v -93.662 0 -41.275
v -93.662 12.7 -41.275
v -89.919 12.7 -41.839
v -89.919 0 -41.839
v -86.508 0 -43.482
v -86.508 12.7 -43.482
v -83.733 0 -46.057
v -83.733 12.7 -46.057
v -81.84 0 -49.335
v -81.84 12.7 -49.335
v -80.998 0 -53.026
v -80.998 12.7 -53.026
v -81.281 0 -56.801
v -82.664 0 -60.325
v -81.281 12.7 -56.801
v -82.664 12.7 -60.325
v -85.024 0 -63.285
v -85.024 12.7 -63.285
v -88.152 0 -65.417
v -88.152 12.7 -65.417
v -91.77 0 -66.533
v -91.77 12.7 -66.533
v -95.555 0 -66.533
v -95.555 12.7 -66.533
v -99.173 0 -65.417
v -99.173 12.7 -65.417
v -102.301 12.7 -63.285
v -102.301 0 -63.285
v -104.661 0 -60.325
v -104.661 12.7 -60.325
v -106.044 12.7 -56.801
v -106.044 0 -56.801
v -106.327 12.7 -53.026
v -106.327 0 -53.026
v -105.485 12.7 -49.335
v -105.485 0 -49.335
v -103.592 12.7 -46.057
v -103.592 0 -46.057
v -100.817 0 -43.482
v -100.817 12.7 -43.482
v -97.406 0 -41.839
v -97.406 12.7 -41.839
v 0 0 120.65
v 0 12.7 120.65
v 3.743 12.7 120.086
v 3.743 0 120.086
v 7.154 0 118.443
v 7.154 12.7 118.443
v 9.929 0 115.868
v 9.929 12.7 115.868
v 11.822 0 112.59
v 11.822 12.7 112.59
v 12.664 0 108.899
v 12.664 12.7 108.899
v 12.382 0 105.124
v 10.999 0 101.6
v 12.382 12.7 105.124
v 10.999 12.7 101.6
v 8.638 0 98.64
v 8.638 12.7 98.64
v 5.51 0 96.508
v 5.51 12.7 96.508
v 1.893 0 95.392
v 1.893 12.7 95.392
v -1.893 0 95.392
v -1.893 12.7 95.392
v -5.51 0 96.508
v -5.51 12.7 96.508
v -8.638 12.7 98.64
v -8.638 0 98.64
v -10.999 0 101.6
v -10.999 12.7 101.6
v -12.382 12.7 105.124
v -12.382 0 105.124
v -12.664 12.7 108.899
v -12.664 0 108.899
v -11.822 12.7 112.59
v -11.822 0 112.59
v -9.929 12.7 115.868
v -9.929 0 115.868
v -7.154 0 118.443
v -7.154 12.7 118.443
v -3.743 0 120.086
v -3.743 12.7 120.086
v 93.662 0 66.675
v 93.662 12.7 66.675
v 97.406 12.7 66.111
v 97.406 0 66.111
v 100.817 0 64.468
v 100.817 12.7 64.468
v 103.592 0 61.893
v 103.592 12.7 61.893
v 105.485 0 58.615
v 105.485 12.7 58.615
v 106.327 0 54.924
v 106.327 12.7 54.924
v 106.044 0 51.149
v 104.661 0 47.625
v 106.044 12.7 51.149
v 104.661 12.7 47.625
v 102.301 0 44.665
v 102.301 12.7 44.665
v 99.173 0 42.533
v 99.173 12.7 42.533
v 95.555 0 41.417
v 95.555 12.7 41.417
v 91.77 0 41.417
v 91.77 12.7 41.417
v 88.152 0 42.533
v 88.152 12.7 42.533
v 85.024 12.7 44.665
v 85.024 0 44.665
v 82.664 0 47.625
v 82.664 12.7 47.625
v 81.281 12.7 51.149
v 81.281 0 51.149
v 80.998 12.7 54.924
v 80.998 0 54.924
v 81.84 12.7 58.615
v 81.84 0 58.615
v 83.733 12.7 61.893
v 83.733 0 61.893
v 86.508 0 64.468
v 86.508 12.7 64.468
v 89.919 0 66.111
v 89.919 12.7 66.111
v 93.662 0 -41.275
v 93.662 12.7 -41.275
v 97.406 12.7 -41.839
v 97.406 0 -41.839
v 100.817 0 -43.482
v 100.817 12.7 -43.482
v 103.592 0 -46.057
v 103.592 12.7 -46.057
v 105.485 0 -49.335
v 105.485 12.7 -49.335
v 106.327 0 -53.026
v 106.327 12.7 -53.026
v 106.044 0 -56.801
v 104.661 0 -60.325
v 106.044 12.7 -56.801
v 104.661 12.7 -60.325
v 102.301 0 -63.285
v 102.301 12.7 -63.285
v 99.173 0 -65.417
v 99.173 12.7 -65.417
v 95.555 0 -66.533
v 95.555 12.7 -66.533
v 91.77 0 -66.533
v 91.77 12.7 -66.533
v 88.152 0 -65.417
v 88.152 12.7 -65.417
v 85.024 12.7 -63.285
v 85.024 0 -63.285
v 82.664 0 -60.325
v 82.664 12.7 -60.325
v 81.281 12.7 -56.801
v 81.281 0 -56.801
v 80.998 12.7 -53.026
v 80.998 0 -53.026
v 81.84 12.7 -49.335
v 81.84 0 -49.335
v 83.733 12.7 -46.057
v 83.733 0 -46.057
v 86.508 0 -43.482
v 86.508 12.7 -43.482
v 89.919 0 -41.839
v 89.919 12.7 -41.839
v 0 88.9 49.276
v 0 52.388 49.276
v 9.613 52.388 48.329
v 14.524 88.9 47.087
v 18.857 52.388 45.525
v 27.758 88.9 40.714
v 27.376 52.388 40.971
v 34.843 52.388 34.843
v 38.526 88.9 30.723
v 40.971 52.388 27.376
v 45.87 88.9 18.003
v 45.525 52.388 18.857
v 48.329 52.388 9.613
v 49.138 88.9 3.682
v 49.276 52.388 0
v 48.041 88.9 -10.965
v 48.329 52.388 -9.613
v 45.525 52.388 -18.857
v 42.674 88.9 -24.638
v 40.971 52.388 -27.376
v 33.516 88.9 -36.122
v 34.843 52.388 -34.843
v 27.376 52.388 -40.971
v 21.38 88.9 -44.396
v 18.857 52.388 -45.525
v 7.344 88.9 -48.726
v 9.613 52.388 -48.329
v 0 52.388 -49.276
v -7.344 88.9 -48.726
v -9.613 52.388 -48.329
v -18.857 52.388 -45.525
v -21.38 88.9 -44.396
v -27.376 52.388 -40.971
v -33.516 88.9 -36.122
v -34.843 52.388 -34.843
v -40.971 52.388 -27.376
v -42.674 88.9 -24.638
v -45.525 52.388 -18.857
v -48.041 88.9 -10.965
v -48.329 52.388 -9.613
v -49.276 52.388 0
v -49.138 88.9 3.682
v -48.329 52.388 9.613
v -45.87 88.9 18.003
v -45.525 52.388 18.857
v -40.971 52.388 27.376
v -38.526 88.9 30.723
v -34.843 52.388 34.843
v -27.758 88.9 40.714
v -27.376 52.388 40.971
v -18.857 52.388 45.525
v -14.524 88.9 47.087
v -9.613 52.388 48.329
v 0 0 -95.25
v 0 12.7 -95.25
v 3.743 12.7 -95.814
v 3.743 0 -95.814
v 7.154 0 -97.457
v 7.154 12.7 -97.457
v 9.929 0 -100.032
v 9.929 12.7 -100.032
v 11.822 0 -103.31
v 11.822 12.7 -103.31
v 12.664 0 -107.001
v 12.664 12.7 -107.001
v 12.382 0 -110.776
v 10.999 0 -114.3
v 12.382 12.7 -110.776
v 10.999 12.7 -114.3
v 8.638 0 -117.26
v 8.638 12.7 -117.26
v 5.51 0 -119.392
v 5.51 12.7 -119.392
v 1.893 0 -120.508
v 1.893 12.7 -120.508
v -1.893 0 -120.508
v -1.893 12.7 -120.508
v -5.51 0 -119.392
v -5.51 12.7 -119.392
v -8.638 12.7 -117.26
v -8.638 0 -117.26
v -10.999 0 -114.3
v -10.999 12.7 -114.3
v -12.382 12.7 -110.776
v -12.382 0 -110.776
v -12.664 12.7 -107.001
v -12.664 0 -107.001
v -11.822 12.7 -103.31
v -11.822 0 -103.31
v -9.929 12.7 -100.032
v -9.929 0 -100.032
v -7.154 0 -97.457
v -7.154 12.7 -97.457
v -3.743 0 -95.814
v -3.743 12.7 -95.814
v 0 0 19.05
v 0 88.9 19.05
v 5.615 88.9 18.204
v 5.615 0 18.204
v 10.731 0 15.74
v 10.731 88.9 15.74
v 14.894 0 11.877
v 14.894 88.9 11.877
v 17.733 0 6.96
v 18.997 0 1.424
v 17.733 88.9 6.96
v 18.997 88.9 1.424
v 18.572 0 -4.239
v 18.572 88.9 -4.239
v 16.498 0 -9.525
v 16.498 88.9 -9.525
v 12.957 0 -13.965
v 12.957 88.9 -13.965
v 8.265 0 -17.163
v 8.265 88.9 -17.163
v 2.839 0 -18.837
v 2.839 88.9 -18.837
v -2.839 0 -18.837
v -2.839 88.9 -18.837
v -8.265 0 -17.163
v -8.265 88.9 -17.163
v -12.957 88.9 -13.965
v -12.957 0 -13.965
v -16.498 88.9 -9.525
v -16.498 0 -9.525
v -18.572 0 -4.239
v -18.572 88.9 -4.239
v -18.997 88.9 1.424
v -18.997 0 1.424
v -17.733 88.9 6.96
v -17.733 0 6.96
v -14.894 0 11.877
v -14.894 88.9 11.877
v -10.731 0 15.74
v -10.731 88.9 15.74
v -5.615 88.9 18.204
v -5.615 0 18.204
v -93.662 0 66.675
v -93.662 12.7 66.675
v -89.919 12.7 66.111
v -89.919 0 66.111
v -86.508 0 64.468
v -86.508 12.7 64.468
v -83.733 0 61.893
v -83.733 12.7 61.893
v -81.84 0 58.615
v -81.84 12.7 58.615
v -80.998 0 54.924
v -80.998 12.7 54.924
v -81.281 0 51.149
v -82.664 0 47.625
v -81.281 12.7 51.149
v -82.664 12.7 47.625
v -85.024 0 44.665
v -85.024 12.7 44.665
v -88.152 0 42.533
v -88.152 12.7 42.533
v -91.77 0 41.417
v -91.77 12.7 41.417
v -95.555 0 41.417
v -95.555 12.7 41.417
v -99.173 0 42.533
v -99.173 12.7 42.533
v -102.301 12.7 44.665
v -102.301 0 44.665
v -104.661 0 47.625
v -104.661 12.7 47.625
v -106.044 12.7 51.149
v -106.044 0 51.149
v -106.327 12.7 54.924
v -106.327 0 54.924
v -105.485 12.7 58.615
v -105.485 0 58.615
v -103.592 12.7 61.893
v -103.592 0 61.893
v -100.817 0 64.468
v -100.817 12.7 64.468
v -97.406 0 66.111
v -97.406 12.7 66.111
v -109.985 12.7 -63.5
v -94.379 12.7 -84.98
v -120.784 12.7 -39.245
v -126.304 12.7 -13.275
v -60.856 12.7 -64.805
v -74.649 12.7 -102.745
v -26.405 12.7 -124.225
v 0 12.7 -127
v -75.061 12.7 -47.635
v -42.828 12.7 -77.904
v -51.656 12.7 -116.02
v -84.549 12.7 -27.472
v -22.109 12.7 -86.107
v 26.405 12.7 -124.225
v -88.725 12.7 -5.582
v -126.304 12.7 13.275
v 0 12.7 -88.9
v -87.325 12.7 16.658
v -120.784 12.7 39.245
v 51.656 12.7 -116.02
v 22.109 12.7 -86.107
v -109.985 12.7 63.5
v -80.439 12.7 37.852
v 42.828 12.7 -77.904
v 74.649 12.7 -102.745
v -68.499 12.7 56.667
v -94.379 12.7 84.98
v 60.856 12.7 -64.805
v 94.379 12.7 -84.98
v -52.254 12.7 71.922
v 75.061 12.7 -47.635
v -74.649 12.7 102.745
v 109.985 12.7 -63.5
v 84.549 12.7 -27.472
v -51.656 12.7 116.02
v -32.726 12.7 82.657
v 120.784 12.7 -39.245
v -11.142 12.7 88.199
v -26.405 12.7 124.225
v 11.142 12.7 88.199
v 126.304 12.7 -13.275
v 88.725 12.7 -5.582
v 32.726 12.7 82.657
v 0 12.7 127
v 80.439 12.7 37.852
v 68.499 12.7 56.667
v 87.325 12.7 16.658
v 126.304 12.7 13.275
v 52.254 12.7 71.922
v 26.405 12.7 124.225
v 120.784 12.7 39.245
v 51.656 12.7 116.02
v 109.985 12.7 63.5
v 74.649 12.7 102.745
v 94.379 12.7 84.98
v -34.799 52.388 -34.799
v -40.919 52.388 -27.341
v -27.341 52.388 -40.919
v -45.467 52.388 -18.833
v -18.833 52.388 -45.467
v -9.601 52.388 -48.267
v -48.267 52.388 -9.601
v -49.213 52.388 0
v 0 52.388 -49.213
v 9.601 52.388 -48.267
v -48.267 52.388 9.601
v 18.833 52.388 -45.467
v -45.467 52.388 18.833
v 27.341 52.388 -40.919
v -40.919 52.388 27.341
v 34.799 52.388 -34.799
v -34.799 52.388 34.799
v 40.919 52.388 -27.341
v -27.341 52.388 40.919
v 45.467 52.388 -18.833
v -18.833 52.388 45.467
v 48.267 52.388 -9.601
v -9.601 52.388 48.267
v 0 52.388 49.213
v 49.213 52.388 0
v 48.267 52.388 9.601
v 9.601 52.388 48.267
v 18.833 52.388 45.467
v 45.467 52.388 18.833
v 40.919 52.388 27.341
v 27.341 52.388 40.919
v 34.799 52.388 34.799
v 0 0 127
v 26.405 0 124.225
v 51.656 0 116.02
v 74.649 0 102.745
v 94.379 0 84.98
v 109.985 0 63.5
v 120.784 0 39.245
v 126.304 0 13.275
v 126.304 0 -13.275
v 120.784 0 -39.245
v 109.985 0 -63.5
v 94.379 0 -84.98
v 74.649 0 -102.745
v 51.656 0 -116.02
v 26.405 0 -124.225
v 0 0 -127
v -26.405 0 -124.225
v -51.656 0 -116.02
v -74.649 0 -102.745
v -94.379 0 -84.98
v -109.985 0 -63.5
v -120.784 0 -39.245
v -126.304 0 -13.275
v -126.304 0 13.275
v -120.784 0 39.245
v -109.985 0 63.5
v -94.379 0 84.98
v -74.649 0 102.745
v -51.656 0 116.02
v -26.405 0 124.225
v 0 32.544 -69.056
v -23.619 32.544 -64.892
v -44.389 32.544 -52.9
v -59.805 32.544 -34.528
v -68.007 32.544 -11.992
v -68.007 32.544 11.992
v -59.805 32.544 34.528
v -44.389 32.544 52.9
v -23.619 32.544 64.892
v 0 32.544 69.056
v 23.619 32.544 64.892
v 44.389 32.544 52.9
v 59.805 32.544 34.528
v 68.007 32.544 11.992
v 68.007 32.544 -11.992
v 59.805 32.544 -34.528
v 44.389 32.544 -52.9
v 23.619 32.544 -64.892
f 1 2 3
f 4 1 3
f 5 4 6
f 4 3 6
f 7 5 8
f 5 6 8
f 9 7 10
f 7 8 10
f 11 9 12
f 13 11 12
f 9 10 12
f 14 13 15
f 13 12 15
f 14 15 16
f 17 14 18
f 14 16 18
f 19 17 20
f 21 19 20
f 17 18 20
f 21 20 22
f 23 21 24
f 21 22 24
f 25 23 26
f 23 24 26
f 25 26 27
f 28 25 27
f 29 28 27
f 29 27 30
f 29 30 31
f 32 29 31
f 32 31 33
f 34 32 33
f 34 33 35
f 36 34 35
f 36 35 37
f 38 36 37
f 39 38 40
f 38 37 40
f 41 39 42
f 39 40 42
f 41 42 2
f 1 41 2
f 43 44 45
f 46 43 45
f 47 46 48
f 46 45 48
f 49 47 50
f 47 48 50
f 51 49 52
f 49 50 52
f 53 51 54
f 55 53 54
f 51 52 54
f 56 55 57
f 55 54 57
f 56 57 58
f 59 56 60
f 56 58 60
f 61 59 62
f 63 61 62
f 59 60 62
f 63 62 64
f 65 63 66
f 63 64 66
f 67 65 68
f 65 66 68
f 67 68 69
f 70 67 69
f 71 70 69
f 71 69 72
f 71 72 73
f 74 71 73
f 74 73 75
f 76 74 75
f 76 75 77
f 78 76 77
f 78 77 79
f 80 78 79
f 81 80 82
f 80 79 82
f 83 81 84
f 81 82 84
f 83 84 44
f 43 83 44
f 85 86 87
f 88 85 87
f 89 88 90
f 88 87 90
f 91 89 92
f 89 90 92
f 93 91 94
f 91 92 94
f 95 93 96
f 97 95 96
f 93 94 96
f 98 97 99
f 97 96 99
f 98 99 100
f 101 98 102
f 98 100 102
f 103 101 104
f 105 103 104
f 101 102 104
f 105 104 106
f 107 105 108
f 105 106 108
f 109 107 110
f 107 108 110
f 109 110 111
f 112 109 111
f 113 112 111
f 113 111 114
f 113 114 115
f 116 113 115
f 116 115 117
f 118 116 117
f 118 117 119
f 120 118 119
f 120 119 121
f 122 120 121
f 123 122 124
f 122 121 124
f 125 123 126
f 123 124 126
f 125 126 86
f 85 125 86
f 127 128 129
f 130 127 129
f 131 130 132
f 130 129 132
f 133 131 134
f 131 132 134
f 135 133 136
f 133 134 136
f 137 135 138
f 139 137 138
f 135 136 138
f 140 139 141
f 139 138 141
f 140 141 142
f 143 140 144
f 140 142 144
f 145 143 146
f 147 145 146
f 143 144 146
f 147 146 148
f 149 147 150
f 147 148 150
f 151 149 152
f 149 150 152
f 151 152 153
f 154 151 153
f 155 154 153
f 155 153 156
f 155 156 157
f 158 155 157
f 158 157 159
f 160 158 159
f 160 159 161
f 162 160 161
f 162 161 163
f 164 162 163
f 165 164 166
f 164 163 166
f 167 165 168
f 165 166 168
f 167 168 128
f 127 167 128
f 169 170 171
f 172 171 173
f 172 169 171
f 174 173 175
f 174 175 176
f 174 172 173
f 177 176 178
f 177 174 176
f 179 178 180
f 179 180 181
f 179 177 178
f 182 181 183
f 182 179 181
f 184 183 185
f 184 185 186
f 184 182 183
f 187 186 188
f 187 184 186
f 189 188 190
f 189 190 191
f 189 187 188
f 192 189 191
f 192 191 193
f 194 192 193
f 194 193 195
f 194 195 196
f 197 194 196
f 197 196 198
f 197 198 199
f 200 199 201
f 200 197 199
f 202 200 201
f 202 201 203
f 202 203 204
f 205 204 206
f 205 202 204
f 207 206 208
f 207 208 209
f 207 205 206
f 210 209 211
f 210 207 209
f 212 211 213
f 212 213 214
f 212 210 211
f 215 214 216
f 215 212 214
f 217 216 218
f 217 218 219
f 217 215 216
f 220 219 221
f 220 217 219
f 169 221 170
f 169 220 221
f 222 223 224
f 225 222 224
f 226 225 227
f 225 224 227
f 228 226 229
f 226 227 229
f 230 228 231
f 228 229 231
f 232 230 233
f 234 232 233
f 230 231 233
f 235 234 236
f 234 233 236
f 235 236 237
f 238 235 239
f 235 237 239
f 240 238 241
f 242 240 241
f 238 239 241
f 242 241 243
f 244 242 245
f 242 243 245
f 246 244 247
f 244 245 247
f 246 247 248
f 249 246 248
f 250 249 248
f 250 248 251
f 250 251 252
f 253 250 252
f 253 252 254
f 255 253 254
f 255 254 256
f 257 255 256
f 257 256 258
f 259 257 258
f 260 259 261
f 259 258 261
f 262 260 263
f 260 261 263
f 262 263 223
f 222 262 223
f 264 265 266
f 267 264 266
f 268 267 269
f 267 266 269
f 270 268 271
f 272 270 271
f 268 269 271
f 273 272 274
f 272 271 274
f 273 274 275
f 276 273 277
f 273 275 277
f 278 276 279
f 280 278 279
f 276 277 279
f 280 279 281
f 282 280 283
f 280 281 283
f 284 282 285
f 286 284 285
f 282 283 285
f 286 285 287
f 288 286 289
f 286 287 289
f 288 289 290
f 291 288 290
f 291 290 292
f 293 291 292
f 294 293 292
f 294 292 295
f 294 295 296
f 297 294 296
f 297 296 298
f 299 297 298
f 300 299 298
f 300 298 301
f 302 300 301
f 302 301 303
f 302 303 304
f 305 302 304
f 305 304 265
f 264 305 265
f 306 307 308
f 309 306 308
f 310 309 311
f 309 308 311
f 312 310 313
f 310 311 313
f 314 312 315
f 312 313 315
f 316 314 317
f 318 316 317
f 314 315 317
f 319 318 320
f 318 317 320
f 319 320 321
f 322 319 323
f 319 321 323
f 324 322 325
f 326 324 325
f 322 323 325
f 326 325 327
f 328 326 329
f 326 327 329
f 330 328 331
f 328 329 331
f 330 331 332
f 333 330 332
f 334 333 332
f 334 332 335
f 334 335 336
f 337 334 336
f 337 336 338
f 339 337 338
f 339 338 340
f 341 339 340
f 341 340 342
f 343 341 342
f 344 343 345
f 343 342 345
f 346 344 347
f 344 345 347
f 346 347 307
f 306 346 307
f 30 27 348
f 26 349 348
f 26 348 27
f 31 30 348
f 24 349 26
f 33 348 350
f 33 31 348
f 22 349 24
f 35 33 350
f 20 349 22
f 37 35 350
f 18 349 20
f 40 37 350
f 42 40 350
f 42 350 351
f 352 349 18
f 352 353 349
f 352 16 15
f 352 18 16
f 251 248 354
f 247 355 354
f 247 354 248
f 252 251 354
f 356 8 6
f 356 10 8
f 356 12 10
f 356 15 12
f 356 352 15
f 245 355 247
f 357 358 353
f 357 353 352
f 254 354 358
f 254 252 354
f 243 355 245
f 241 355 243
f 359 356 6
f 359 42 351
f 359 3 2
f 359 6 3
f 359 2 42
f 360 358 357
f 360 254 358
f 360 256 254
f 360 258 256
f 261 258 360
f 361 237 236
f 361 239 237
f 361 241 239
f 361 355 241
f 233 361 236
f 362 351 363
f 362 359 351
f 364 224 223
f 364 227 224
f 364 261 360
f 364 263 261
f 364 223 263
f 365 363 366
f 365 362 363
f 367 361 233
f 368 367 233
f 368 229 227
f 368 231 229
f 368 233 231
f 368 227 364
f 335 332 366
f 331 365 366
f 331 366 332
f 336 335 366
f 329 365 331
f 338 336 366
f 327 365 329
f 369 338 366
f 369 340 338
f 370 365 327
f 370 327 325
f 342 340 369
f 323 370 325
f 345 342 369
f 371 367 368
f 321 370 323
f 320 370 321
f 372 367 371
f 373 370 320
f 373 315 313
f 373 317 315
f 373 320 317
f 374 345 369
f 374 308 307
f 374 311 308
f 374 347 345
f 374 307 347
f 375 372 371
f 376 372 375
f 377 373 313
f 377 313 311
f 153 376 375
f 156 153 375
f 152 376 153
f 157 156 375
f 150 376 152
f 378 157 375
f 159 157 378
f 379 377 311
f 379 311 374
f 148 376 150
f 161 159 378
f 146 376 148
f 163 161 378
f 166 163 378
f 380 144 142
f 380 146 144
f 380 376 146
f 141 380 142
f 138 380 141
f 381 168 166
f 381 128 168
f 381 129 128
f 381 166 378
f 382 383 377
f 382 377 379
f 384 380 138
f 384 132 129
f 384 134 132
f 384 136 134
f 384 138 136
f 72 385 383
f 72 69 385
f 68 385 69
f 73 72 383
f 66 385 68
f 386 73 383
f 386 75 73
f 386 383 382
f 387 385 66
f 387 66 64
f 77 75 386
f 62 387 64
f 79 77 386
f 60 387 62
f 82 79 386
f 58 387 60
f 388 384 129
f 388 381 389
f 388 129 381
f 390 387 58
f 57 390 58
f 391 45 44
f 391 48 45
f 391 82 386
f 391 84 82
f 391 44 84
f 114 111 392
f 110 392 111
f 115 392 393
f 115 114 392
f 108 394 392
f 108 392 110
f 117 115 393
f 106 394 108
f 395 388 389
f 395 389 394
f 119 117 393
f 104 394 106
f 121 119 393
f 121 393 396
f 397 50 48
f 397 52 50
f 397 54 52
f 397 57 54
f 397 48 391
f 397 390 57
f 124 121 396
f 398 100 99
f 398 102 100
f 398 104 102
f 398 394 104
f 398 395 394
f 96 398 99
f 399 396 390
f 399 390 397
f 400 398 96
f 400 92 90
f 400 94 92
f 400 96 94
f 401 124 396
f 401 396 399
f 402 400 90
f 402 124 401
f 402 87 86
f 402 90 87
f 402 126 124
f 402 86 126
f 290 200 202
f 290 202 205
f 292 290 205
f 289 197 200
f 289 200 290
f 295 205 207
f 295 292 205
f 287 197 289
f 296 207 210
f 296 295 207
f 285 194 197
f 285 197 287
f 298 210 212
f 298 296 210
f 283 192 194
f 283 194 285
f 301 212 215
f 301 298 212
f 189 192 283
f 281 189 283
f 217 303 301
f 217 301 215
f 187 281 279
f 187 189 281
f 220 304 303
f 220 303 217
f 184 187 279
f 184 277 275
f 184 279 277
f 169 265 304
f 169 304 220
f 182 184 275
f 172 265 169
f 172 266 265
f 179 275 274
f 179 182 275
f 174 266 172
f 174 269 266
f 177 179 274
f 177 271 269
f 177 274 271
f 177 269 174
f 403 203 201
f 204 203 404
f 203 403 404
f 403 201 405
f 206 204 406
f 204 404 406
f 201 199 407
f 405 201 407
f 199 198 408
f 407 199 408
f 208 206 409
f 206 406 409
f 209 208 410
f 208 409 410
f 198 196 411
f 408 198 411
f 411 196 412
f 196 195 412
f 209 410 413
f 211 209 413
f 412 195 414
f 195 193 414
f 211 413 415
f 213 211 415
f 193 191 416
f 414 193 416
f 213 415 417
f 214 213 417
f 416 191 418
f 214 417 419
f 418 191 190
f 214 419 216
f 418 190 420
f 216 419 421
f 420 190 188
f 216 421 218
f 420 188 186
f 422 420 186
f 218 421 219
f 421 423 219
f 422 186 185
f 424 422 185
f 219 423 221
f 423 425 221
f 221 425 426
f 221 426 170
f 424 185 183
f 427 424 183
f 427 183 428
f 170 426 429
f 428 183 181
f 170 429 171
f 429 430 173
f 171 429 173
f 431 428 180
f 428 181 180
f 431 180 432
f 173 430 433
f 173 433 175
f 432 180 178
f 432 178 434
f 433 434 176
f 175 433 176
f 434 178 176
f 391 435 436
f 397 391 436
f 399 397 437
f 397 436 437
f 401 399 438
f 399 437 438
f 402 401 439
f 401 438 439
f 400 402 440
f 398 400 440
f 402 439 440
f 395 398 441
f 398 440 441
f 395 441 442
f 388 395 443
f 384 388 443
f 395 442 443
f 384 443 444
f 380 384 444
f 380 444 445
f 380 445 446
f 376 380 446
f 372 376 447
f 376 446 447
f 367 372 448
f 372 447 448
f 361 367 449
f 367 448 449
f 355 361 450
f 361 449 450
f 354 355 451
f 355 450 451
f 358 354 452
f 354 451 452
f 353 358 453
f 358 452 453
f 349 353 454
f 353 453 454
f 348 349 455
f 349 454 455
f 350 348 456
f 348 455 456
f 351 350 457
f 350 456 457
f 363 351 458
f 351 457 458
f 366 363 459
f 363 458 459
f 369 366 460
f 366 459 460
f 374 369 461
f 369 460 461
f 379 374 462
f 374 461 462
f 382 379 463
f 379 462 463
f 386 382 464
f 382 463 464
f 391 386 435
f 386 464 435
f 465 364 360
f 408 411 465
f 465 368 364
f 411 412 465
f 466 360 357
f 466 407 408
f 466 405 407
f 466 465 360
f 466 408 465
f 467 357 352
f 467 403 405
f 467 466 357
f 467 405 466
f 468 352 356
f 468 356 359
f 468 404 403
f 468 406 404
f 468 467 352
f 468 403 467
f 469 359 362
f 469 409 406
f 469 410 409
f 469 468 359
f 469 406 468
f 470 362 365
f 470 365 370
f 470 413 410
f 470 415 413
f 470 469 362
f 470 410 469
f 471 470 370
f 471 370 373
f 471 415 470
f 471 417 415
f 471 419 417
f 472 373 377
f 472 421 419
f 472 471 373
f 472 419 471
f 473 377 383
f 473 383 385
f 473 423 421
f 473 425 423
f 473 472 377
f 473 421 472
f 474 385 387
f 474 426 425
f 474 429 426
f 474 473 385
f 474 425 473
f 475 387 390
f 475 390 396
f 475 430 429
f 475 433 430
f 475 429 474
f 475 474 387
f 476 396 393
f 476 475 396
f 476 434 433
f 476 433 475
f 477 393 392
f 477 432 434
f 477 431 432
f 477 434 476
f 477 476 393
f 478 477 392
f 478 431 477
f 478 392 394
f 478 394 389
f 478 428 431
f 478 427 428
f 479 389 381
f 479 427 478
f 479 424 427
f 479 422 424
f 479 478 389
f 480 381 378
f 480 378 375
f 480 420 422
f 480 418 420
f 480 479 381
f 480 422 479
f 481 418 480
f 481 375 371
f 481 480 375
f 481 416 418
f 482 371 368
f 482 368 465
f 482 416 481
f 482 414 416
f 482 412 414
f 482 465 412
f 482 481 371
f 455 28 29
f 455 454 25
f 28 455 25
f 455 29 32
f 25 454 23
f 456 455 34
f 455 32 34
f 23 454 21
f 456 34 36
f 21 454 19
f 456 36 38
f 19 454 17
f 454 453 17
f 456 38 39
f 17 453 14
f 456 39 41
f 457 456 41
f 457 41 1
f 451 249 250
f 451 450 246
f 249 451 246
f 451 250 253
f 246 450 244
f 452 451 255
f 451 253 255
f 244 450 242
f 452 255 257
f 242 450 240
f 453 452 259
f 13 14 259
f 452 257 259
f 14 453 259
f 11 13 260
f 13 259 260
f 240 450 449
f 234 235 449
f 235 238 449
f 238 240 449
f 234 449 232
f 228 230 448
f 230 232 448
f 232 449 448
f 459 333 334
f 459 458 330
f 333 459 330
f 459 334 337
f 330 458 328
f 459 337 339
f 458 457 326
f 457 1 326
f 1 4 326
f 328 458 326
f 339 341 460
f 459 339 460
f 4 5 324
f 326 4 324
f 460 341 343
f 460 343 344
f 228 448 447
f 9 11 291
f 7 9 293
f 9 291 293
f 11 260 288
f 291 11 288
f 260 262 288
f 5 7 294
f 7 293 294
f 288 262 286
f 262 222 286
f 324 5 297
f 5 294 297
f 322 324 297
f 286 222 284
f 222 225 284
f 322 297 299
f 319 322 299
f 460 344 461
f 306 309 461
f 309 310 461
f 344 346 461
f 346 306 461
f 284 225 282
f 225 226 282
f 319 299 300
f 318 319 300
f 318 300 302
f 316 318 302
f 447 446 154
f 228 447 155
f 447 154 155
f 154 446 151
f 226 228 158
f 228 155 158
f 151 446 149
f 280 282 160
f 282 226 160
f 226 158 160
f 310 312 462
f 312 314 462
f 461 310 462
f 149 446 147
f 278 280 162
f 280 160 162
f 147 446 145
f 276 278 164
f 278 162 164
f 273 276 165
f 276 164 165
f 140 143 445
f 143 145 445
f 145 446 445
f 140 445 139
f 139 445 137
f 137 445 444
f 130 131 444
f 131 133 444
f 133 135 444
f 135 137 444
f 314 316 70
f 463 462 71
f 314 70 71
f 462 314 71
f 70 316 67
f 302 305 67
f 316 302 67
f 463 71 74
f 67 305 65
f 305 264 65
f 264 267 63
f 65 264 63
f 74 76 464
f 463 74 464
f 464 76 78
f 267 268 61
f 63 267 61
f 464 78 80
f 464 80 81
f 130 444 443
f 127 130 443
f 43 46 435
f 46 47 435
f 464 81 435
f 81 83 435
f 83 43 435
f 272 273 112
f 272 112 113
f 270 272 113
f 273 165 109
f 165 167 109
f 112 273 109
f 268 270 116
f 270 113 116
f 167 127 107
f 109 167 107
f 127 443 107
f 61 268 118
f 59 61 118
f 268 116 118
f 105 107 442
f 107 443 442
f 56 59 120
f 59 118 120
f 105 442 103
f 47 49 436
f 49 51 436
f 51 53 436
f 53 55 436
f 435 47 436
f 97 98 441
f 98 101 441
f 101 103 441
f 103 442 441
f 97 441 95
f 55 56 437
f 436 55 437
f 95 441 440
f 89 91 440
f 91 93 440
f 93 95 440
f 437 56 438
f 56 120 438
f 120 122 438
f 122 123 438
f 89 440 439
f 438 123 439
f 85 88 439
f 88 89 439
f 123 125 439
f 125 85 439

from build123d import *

# Parameters (mm, degrees)
SKETCH1_R           = 127
BOSS_EXTRUDE1_DEPTH = 12.7
SKETCH2_R           = 12.7
CUT_EXTRUDE1_DEPTH  = 12.7
SKETCH3_R           = 88.9
BOSS_EXTRUDE2_DEPTH = 39.6875
CHAMFER1_SIZE       = 39.6875
SKETCH4_R           = 19.05
CUT_EXTRUDE5_DEPTH  = 88.4555
BOSS_EXTRUDE3_START = 36.5125
SKETCH5_R           = 49.276
SKETCH5_R_2         = 19.05
BOSS_EXTRUDE3_DEPTH = 36.5125


with BuildPart() as part:
    # Sketch1 → Boss-Extrude1 (new body)
    with BuildSketch(Plane(origin=(0, 0, 0), x_dir=(1, 0, 0), z_dir=(0, 1, 0))):
        with Locations(Location((0, 0, 0), (0, 0, 270))):
            Circle(SKETCH1_R)
    extrude(amount=BOSS_EXTRUDE1_DEPTH)

    # Sketch2 → Cut-Extrude1 (cut)
    with BuildSketch(Plane(origin=(0, 12.7, 0), x_dir=(1, 0, 0), z_dir=(0, 1, 0))):
        with Locations(Location((0, 107.95, 0), (0, 0, 270))):
            Circle(SKETCH2_R)
        with Locations(Location((0, -107.95, 0), (0, 0, 270))):
            Circle(SKETCH2_R)
        with Locations(Location((-93.6625, -53.975, 0), (0, 0, 270))):
            Circle(SKETCH2_R)
        with Locations(Location((-93.6625, 53.975, 0), (0, 0, 270))):
            Circle(SKETCH2_R)
        with Locations(Location((93.6625, 53.975, 0), (0, 0, 270))):
            Circle(SKETCH2_R)
        with Locations(Location((93.6625, -53.975, 0), (0, 0, 270))):
            Circle(SKETCH2_R)
    extrude(amount=-CUT_EXTRUDE1_DEPTH, mode=Mode.SUBTRACT)

    # Sketch3 → Boss-Extrude2 (add)
    with BuildSketch(Plane(origin=(0, 12.7, 0), x_dir=(1, 0, 0), z_dir=(0, 1, 0))):
        with Locations(Location((0, 0, 0), (0, 0, 90))):
            Circle(SKETCH3_R)
    extrude(amount=BOSS_EXTRUDE2_DEPTH)

    # Chamfer1
    chamfer1_edges = [part.edges().sort_by_distance(p)[0] for p in [
        (0, 52.3875, 88.9),
    ]]
    chamfer(chamfer1_edges, length=CHAMFER1_SIZE - 0.0001)  # a hair under: the kernel refuses the full size

    # Sketch4 → Cut-Extrude5 (cut)
    with BuildSketch(Plane(origin=(0, 52.3875, 0), x_dir=(1, 0, 0), z_dir=(0, 1, 0))):
        with Locations(Location((0, 0, 0), (0, 0, 270))):
            Circle(SKETCH4_R)
    extrude(amount=-CUT_EXTRUDE5_DEPTH, mode=Mode.SUBTRACT)

    # Sketch5 → Boss-Extrude3 (add)
    with BuildSketch(Plane(origin=(0, 52.3875, 0), x_dir=(1, 0, 0), z_dir=(0, 1, 0)).offset(BOSS_EXTRUDE3_START)):
        with Locations(Location((0, 0, 0), (0, 0, 270))):
            Circle(SKETCH5_R)
        with Locations(Location((0, 0, 0), (0, 0, 270))):
            Circle(SKETCH5_R_2, mode=Mode.SUBTRACT)
    extrude(amount=-BOSS_EXTRUDE3_DEPTH)


solid = part.part
